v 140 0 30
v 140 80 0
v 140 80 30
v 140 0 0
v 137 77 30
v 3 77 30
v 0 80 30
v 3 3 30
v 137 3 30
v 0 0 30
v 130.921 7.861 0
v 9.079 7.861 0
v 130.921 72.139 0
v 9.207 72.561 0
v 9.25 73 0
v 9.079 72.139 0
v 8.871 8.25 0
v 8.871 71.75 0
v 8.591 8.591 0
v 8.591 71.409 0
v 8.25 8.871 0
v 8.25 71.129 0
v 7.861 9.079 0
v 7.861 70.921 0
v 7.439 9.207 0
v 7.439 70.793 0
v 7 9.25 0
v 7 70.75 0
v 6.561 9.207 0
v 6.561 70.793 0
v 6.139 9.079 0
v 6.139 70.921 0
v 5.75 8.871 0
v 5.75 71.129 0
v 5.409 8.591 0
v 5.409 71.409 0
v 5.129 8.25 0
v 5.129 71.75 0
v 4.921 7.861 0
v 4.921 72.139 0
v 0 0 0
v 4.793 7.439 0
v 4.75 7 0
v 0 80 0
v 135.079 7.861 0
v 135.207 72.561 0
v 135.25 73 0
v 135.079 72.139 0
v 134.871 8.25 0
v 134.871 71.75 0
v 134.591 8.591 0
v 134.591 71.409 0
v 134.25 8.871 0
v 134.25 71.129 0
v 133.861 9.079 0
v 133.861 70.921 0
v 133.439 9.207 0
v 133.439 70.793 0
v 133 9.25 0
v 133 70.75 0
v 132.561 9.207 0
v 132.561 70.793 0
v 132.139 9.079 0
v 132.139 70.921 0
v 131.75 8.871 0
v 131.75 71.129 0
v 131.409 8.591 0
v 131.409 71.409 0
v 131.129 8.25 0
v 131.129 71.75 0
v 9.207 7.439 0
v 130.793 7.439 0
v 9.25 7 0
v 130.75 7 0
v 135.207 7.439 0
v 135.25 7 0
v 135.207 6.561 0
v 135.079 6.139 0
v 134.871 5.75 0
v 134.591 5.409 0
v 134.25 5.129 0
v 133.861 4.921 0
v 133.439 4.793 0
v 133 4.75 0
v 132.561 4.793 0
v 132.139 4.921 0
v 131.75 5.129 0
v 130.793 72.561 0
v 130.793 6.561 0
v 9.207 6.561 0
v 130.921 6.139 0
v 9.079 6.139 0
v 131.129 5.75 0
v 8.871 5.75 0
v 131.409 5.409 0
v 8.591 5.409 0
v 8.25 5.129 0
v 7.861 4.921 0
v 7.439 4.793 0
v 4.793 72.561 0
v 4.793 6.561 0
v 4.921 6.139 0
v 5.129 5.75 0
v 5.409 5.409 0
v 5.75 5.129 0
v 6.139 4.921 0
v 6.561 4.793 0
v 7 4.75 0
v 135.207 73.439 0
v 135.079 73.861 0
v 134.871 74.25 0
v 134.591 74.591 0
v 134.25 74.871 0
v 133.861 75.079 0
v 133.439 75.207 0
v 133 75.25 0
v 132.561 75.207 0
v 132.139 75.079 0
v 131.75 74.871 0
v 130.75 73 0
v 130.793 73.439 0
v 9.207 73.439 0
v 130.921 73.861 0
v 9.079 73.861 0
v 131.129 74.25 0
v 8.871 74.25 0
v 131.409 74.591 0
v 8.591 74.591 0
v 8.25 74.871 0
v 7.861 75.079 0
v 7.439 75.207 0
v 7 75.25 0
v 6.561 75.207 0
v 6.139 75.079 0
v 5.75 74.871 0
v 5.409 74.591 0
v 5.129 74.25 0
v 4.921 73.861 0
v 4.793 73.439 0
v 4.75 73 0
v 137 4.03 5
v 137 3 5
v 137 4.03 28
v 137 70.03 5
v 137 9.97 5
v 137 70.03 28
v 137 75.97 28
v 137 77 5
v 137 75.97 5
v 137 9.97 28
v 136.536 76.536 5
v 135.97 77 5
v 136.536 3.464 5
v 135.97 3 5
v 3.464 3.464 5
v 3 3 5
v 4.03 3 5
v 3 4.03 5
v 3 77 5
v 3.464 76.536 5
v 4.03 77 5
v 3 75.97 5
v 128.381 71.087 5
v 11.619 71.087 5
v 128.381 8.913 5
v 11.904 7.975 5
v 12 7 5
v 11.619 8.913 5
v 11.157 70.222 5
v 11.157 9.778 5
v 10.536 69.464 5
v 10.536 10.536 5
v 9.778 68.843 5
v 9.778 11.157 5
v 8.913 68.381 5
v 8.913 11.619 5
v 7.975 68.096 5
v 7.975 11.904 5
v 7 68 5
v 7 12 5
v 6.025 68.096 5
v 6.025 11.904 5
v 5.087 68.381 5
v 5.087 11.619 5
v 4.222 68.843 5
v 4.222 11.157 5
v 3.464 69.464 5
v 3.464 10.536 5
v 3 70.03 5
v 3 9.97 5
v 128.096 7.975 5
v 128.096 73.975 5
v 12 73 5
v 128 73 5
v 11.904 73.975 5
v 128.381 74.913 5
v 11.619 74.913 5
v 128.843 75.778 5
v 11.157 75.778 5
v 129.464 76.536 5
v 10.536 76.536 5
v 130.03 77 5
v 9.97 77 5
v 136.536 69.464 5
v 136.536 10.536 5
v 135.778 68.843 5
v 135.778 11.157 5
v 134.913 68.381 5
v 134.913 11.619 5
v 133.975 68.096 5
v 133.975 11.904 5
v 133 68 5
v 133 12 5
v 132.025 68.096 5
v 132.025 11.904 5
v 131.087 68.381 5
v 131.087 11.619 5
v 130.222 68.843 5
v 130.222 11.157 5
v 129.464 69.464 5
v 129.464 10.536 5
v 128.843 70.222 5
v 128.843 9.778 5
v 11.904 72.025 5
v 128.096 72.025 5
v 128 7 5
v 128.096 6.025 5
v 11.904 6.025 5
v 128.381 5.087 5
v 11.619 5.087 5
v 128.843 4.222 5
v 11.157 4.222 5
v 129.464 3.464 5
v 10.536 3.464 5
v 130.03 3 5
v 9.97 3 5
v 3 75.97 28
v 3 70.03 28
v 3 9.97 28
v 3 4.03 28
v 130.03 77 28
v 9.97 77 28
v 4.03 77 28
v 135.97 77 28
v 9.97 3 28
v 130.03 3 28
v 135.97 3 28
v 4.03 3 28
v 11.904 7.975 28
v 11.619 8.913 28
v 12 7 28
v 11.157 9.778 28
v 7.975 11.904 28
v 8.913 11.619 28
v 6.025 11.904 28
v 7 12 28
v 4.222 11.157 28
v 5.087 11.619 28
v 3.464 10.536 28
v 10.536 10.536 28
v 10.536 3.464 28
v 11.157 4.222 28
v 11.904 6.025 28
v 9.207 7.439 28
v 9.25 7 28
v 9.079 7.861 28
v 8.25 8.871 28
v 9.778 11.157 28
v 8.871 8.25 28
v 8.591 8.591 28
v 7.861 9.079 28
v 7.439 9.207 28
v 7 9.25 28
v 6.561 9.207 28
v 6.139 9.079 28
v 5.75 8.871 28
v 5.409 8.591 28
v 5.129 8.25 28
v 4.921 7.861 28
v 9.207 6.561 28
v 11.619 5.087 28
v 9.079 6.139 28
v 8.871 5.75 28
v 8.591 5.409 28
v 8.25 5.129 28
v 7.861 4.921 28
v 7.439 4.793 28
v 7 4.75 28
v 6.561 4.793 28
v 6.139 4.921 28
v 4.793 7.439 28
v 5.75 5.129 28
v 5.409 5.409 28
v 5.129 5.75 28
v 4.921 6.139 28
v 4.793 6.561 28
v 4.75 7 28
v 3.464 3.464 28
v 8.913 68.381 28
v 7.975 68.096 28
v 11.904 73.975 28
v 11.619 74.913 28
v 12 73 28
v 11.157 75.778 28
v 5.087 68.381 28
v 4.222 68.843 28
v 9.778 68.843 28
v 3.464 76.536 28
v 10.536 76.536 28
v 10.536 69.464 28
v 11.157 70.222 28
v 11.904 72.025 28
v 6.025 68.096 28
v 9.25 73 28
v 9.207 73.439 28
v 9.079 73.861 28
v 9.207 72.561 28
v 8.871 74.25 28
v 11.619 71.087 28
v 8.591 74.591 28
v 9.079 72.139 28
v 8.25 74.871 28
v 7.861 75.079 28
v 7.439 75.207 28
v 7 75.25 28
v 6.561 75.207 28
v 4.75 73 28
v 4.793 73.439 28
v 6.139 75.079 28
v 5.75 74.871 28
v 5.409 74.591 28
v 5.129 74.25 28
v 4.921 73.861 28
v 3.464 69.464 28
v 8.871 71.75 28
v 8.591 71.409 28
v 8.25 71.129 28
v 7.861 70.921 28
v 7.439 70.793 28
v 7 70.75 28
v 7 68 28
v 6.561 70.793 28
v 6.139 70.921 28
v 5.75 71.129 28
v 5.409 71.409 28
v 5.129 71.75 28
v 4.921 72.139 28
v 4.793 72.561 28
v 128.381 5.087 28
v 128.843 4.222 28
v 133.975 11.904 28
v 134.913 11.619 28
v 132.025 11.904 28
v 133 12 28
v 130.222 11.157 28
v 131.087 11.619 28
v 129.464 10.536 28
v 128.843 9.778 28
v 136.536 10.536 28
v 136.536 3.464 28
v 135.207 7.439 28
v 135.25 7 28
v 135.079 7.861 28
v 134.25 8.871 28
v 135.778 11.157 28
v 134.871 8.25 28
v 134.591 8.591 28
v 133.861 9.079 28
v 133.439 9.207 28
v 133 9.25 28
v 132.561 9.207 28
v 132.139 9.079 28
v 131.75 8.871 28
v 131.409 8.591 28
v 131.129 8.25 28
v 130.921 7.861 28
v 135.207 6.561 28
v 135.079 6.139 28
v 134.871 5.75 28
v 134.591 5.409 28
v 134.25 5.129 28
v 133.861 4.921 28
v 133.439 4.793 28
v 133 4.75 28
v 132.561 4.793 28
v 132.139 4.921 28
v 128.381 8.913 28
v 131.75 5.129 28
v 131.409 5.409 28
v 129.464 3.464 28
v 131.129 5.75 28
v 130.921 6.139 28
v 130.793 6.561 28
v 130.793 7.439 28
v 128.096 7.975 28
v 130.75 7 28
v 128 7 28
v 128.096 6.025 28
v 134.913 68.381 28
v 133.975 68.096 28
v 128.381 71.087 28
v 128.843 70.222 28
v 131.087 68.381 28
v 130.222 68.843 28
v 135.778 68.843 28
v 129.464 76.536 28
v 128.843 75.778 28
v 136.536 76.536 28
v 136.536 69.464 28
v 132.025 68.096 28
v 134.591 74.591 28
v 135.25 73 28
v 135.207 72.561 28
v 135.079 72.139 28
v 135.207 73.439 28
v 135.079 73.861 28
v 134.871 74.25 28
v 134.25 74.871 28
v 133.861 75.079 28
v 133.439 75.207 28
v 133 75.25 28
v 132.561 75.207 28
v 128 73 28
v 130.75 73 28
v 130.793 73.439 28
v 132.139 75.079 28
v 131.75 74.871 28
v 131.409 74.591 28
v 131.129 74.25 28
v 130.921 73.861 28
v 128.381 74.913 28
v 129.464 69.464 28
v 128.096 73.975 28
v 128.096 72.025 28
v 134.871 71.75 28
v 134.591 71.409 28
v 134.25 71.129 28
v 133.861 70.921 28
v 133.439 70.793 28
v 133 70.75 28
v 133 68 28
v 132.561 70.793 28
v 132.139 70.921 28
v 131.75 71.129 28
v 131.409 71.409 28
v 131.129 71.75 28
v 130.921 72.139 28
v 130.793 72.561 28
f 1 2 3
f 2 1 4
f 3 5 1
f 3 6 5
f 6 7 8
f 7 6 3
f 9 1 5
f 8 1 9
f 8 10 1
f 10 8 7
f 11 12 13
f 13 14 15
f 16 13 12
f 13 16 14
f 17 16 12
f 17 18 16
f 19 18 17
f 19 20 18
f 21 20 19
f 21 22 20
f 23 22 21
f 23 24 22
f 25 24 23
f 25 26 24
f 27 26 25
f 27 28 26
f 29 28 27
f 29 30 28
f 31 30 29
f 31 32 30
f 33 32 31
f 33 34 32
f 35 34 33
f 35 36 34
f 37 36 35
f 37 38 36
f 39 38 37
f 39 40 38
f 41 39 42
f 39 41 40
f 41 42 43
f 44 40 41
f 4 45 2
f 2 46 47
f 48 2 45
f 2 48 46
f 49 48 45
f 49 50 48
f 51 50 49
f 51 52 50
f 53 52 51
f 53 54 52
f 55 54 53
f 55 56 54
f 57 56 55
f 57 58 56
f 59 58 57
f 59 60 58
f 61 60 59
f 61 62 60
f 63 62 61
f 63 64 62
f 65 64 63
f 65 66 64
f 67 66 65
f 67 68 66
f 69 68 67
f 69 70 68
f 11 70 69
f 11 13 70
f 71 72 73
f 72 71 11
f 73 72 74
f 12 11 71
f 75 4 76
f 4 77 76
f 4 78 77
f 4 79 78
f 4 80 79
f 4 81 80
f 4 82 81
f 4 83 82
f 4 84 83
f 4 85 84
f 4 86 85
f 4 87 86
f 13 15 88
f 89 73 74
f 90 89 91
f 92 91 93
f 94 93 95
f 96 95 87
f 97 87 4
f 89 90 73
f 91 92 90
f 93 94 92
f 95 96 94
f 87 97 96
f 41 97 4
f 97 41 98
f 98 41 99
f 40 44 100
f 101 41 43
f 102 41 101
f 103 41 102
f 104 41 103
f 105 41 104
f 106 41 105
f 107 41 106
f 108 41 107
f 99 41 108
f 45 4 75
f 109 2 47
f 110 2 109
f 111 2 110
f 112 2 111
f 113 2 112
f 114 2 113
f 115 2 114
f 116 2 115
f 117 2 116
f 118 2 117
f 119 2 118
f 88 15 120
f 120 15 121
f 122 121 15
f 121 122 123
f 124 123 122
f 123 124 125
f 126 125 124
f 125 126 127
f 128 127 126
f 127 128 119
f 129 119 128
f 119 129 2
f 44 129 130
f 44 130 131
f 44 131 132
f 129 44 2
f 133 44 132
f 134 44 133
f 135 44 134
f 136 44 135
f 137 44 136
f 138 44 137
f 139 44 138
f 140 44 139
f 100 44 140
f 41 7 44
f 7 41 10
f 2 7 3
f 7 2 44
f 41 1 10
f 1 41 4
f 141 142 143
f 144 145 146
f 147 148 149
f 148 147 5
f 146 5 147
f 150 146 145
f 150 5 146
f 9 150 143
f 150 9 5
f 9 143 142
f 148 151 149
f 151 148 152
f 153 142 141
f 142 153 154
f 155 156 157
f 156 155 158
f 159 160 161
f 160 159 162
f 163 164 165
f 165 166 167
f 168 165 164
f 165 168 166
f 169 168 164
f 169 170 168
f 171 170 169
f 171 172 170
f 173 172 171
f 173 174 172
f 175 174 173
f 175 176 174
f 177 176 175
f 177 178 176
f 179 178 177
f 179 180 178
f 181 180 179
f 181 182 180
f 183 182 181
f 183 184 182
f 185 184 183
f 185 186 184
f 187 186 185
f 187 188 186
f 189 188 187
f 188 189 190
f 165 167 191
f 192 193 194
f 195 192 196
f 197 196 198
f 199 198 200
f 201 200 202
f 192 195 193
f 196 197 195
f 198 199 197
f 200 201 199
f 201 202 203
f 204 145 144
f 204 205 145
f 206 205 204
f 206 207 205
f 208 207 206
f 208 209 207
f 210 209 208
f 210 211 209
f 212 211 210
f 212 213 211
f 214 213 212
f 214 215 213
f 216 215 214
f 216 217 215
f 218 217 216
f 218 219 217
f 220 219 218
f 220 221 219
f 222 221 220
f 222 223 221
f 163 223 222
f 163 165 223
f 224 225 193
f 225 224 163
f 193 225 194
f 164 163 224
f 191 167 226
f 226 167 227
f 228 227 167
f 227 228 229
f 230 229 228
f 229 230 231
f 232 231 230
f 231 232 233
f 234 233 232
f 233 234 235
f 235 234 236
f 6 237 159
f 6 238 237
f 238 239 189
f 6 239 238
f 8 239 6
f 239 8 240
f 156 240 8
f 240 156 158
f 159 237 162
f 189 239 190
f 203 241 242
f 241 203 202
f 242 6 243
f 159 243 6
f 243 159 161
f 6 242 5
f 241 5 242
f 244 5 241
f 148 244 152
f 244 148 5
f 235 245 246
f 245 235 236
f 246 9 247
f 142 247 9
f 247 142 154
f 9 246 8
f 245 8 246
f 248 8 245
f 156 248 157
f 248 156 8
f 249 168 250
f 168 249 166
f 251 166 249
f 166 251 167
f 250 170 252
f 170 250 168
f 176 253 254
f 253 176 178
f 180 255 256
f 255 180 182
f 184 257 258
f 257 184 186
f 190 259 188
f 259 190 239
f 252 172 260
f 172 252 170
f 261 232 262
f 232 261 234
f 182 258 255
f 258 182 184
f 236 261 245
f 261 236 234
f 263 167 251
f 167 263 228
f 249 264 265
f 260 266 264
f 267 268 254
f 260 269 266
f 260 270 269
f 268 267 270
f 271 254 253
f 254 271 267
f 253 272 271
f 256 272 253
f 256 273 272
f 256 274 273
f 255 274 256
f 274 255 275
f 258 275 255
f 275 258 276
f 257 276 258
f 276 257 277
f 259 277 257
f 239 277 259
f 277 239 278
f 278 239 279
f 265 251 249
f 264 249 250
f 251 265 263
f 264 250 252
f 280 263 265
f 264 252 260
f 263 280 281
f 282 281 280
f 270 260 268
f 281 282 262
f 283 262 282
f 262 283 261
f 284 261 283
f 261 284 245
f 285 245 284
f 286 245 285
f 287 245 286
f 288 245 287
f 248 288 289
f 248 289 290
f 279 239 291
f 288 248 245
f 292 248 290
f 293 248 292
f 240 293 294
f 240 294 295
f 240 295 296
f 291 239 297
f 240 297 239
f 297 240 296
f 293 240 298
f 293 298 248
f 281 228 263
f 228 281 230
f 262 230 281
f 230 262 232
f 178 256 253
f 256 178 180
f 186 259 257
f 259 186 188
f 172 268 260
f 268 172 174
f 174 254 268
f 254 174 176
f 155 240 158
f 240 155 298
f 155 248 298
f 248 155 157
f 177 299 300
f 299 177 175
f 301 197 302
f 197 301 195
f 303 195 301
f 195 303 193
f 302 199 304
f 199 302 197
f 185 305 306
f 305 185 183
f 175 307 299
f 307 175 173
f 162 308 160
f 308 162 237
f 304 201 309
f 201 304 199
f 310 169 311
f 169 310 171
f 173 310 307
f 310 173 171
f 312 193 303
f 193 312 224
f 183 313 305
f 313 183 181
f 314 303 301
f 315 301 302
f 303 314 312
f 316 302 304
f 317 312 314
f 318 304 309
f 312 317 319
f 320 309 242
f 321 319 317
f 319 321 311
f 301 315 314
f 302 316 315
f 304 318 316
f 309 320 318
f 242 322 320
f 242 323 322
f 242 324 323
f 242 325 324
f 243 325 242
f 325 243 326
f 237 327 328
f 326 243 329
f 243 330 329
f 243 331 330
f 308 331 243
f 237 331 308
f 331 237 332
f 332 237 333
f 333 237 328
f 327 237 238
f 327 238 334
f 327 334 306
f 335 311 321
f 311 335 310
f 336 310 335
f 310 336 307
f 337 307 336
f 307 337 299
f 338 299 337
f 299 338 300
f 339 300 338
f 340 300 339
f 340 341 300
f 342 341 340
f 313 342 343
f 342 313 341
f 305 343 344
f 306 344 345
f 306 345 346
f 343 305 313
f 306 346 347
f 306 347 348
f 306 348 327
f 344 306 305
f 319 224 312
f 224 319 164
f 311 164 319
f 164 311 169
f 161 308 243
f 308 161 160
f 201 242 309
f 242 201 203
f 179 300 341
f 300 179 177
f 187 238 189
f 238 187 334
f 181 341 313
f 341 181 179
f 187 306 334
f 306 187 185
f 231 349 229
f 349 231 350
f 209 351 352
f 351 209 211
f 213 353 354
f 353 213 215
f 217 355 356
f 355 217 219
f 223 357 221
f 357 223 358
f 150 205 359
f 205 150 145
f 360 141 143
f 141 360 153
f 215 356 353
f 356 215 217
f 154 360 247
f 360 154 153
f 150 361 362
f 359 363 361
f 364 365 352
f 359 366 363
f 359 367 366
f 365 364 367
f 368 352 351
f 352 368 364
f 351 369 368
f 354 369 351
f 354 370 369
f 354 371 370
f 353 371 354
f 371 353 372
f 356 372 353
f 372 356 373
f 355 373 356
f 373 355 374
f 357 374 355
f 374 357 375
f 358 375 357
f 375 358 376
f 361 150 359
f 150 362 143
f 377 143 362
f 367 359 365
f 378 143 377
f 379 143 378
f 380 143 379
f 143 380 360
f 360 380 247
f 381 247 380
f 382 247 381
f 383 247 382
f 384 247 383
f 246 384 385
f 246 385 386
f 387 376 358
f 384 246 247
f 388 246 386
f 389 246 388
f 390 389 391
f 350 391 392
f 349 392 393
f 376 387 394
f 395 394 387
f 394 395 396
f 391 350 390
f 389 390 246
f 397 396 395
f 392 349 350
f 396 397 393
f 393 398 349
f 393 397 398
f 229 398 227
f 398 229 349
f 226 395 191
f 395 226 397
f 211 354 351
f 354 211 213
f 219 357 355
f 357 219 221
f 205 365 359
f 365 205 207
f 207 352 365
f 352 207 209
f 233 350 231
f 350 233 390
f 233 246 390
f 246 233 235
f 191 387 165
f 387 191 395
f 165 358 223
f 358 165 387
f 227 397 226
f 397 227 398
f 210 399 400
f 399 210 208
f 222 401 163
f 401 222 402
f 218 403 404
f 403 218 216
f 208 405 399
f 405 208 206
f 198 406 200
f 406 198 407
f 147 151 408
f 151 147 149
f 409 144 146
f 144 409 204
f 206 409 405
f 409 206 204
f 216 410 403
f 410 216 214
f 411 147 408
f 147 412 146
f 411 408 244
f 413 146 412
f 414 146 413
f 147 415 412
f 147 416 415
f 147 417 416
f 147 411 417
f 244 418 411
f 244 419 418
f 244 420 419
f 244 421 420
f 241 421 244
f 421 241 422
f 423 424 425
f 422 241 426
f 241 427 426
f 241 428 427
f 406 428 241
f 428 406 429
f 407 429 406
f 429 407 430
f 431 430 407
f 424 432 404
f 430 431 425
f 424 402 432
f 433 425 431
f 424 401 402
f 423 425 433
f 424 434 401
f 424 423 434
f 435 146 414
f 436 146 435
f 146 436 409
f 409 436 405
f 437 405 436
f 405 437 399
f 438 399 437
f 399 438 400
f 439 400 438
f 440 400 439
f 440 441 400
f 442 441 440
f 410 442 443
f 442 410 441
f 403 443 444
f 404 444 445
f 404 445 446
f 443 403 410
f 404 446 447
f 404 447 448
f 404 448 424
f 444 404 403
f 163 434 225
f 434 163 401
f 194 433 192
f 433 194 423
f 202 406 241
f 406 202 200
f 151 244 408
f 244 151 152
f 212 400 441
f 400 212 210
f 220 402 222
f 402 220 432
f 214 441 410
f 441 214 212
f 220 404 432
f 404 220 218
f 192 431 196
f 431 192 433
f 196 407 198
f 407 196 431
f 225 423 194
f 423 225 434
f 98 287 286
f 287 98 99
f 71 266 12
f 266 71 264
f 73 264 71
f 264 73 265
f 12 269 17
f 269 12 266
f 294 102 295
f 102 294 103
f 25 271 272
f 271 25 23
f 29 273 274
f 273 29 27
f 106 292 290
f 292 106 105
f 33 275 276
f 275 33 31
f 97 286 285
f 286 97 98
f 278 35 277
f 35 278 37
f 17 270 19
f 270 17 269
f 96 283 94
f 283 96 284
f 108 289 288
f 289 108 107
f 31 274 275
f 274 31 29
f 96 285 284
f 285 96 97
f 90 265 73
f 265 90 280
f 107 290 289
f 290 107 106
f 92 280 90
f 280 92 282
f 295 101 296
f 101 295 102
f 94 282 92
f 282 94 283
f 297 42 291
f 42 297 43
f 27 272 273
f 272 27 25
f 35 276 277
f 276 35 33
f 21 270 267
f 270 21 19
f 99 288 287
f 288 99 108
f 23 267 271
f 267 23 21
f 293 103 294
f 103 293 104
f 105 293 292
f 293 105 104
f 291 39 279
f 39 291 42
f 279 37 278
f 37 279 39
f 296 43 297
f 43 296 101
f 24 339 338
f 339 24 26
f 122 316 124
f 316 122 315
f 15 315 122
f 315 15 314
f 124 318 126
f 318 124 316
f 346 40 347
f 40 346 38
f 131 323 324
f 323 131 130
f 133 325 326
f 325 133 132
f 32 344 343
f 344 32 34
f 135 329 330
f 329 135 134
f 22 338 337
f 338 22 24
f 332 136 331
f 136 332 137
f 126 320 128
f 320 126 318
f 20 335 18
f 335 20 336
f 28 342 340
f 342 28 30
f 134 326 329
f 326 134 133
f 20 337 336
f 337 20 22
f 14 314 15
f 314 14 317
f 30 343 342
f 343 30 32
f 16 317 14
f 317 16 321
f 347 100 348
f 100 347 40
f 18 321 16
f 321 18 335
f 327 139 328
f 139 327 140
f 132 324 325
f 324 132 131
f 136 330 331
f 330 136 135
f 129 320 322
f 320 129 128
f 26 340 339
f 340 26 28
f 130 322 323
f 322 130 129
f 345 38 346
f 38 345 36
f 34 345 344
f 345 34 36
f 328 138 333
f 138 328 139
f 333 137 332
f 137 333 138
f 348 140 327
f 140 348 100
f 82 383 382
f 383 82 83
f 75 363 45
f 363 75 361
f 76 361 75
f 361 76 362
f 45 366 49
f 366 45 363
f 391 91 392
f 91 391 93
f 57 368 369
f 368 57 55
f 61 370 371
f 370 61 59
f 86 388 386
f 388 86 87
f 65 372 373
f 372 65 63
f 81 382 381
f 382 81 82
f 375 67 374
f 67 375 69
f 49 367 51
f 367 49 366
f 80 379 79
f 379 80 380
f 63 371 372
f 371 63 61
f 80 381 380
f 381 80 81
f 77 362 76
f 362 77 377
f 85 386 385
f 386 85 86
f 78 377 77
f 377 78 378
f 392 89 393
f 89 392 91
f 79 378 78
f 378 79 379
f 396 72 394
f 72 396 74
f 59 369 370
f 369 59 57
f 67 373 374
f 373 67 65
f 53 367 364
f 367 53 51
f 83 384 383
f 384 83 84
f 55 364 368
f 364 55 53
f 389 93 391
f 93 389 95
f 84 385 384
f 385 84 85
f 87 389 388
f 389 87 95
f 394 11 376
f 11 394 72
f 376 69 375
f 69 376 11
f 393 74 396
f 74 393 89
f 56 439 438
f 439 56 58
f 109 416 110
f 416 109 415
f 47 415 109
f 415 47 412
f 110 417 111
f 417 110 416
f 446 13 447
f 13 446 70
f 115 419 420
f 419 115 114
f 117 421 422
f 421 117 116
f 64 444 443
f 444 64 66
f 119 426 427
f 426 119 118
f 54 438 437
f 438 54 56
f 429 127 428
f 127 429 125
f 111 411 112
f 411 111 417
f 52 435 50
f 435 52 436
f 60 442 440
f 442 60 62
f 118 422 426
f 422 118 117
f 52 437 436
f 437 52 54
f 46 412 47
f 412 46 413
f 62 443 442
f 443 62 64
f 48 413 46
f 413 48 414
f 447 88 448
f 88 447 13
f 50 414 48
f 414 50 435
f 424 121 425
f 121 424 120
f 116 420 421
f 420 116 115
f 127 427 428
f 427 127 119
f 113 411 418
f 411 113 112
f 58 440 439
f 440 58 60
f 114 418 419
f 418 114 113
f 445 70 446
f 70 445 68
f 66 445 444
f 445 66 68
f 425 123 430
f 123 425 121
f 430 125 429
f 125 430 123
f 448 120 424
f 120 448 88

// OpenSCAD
$fn = 32;

// ----------------------------------------------------------------------
// Enclosure body: 140 x 80 x 30 mm, wall 3 mm
// ----------------------------------------------------------------------

// --- parameters (mm) ---
length = 140;             // outside length, X
width = 80;               // outside width, Y
height = 30;              // outside height, Z
wall = 3;                 // side wall thickness
floor_t = 5;              // floor thickness
boss_d = 10;              // corner boss diameter
boss_h = 23;              // corner boss height above the floor
boss_hole_d = 4.5;        // lid screw clearance in the boss
boss_lip = 7;             // boss centre inset from the corner

module shell() {
  difference() {
    cube([length, width, height]);
    /* hollow, open at the top */
    translate([wall, wall, floor_t])
      cube([length - 2 * wall, width - 2 * wall, height]);
  }
}

module bosses() {
  /* corner bosses, sunk 1 mm into the floor */
  for (sx = [0, 1]) for (sy = [0, 1])
    translate([sx * (length - 2 * boss_lip) + boss_lip, sy * (width - 2 * boss_lip) + boss_lip, floor_t - 1])
      cylinder(h = boss_h + 1, d = boss_d);
}

difference() {
  union() {
    shell();
    bosses();
  }
  /* boss screw holes */
  for (sx = [0, 1]) for (sy = [0, 1])
    translate([sx * (length - 2 * boss_lip) + boss_lip, sy * (width - 2 * boss_lip) + boss_lip, -1]) cylinder(h = floor_t + boss_h + 2, d = boss_hole_d);
}
